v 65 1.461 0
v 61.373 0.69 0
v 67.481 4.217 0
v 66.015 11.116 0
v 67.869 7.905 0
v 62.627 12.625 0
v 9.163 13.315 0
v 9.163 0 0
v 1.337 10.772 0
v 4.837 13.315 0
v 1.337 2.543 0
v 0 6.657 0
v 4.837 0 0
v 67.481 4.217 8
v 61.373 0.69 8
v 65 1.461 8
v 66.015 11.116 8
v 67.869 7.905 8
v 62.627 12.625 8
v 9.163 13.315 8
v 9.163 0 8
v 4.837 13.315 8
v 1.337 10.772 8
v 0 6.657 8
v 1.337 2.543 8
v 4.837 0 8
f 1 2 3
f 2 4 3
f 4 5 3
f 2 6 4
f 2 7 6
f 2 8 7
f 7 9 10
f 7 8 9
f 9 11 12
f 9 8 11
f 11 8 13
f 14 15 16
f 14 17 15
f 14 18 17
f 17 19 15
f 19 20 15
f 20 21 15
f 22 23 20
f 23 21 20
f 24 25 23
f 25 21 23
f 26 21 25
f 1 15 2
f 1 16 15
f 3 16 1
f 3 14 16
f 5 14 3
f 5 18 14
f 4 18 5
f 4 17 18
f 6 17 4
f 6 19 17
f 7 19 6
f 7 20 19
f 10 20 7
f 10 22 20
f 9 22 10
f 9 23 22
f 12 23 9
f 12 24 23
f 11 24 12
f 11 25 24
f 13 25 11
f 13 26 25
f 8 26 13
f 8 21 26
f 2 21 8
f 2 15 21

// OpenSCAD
$fn = 32;

// ----------------------------------------------------------------------
// Lever arm: two bosses 14 and 12 mm, 55 mm between centres
// ----------------------------------------------------------------------

// --- parameters (mm) ---
profile_height = 8;       // extrusion height
profile_points = 13;      // points of the closed outline

profile = [[0, 6.657], [1.337, 2.543], [4.837, 0], [9.163, 0], [61.373, 0.69], [65, 1.461], [67.481, 4.217], [67.869, 7.905], [66.015, 11.116], [62.627, 12.625], [9.163, 13.315], [4.837, 13.315], [1.337, 10.772]];  // single closed polygon, 13 points, counter clockwise

// --- the one profile operation ---
linear_extrude(height = profile_height) polygon(points = profile);
